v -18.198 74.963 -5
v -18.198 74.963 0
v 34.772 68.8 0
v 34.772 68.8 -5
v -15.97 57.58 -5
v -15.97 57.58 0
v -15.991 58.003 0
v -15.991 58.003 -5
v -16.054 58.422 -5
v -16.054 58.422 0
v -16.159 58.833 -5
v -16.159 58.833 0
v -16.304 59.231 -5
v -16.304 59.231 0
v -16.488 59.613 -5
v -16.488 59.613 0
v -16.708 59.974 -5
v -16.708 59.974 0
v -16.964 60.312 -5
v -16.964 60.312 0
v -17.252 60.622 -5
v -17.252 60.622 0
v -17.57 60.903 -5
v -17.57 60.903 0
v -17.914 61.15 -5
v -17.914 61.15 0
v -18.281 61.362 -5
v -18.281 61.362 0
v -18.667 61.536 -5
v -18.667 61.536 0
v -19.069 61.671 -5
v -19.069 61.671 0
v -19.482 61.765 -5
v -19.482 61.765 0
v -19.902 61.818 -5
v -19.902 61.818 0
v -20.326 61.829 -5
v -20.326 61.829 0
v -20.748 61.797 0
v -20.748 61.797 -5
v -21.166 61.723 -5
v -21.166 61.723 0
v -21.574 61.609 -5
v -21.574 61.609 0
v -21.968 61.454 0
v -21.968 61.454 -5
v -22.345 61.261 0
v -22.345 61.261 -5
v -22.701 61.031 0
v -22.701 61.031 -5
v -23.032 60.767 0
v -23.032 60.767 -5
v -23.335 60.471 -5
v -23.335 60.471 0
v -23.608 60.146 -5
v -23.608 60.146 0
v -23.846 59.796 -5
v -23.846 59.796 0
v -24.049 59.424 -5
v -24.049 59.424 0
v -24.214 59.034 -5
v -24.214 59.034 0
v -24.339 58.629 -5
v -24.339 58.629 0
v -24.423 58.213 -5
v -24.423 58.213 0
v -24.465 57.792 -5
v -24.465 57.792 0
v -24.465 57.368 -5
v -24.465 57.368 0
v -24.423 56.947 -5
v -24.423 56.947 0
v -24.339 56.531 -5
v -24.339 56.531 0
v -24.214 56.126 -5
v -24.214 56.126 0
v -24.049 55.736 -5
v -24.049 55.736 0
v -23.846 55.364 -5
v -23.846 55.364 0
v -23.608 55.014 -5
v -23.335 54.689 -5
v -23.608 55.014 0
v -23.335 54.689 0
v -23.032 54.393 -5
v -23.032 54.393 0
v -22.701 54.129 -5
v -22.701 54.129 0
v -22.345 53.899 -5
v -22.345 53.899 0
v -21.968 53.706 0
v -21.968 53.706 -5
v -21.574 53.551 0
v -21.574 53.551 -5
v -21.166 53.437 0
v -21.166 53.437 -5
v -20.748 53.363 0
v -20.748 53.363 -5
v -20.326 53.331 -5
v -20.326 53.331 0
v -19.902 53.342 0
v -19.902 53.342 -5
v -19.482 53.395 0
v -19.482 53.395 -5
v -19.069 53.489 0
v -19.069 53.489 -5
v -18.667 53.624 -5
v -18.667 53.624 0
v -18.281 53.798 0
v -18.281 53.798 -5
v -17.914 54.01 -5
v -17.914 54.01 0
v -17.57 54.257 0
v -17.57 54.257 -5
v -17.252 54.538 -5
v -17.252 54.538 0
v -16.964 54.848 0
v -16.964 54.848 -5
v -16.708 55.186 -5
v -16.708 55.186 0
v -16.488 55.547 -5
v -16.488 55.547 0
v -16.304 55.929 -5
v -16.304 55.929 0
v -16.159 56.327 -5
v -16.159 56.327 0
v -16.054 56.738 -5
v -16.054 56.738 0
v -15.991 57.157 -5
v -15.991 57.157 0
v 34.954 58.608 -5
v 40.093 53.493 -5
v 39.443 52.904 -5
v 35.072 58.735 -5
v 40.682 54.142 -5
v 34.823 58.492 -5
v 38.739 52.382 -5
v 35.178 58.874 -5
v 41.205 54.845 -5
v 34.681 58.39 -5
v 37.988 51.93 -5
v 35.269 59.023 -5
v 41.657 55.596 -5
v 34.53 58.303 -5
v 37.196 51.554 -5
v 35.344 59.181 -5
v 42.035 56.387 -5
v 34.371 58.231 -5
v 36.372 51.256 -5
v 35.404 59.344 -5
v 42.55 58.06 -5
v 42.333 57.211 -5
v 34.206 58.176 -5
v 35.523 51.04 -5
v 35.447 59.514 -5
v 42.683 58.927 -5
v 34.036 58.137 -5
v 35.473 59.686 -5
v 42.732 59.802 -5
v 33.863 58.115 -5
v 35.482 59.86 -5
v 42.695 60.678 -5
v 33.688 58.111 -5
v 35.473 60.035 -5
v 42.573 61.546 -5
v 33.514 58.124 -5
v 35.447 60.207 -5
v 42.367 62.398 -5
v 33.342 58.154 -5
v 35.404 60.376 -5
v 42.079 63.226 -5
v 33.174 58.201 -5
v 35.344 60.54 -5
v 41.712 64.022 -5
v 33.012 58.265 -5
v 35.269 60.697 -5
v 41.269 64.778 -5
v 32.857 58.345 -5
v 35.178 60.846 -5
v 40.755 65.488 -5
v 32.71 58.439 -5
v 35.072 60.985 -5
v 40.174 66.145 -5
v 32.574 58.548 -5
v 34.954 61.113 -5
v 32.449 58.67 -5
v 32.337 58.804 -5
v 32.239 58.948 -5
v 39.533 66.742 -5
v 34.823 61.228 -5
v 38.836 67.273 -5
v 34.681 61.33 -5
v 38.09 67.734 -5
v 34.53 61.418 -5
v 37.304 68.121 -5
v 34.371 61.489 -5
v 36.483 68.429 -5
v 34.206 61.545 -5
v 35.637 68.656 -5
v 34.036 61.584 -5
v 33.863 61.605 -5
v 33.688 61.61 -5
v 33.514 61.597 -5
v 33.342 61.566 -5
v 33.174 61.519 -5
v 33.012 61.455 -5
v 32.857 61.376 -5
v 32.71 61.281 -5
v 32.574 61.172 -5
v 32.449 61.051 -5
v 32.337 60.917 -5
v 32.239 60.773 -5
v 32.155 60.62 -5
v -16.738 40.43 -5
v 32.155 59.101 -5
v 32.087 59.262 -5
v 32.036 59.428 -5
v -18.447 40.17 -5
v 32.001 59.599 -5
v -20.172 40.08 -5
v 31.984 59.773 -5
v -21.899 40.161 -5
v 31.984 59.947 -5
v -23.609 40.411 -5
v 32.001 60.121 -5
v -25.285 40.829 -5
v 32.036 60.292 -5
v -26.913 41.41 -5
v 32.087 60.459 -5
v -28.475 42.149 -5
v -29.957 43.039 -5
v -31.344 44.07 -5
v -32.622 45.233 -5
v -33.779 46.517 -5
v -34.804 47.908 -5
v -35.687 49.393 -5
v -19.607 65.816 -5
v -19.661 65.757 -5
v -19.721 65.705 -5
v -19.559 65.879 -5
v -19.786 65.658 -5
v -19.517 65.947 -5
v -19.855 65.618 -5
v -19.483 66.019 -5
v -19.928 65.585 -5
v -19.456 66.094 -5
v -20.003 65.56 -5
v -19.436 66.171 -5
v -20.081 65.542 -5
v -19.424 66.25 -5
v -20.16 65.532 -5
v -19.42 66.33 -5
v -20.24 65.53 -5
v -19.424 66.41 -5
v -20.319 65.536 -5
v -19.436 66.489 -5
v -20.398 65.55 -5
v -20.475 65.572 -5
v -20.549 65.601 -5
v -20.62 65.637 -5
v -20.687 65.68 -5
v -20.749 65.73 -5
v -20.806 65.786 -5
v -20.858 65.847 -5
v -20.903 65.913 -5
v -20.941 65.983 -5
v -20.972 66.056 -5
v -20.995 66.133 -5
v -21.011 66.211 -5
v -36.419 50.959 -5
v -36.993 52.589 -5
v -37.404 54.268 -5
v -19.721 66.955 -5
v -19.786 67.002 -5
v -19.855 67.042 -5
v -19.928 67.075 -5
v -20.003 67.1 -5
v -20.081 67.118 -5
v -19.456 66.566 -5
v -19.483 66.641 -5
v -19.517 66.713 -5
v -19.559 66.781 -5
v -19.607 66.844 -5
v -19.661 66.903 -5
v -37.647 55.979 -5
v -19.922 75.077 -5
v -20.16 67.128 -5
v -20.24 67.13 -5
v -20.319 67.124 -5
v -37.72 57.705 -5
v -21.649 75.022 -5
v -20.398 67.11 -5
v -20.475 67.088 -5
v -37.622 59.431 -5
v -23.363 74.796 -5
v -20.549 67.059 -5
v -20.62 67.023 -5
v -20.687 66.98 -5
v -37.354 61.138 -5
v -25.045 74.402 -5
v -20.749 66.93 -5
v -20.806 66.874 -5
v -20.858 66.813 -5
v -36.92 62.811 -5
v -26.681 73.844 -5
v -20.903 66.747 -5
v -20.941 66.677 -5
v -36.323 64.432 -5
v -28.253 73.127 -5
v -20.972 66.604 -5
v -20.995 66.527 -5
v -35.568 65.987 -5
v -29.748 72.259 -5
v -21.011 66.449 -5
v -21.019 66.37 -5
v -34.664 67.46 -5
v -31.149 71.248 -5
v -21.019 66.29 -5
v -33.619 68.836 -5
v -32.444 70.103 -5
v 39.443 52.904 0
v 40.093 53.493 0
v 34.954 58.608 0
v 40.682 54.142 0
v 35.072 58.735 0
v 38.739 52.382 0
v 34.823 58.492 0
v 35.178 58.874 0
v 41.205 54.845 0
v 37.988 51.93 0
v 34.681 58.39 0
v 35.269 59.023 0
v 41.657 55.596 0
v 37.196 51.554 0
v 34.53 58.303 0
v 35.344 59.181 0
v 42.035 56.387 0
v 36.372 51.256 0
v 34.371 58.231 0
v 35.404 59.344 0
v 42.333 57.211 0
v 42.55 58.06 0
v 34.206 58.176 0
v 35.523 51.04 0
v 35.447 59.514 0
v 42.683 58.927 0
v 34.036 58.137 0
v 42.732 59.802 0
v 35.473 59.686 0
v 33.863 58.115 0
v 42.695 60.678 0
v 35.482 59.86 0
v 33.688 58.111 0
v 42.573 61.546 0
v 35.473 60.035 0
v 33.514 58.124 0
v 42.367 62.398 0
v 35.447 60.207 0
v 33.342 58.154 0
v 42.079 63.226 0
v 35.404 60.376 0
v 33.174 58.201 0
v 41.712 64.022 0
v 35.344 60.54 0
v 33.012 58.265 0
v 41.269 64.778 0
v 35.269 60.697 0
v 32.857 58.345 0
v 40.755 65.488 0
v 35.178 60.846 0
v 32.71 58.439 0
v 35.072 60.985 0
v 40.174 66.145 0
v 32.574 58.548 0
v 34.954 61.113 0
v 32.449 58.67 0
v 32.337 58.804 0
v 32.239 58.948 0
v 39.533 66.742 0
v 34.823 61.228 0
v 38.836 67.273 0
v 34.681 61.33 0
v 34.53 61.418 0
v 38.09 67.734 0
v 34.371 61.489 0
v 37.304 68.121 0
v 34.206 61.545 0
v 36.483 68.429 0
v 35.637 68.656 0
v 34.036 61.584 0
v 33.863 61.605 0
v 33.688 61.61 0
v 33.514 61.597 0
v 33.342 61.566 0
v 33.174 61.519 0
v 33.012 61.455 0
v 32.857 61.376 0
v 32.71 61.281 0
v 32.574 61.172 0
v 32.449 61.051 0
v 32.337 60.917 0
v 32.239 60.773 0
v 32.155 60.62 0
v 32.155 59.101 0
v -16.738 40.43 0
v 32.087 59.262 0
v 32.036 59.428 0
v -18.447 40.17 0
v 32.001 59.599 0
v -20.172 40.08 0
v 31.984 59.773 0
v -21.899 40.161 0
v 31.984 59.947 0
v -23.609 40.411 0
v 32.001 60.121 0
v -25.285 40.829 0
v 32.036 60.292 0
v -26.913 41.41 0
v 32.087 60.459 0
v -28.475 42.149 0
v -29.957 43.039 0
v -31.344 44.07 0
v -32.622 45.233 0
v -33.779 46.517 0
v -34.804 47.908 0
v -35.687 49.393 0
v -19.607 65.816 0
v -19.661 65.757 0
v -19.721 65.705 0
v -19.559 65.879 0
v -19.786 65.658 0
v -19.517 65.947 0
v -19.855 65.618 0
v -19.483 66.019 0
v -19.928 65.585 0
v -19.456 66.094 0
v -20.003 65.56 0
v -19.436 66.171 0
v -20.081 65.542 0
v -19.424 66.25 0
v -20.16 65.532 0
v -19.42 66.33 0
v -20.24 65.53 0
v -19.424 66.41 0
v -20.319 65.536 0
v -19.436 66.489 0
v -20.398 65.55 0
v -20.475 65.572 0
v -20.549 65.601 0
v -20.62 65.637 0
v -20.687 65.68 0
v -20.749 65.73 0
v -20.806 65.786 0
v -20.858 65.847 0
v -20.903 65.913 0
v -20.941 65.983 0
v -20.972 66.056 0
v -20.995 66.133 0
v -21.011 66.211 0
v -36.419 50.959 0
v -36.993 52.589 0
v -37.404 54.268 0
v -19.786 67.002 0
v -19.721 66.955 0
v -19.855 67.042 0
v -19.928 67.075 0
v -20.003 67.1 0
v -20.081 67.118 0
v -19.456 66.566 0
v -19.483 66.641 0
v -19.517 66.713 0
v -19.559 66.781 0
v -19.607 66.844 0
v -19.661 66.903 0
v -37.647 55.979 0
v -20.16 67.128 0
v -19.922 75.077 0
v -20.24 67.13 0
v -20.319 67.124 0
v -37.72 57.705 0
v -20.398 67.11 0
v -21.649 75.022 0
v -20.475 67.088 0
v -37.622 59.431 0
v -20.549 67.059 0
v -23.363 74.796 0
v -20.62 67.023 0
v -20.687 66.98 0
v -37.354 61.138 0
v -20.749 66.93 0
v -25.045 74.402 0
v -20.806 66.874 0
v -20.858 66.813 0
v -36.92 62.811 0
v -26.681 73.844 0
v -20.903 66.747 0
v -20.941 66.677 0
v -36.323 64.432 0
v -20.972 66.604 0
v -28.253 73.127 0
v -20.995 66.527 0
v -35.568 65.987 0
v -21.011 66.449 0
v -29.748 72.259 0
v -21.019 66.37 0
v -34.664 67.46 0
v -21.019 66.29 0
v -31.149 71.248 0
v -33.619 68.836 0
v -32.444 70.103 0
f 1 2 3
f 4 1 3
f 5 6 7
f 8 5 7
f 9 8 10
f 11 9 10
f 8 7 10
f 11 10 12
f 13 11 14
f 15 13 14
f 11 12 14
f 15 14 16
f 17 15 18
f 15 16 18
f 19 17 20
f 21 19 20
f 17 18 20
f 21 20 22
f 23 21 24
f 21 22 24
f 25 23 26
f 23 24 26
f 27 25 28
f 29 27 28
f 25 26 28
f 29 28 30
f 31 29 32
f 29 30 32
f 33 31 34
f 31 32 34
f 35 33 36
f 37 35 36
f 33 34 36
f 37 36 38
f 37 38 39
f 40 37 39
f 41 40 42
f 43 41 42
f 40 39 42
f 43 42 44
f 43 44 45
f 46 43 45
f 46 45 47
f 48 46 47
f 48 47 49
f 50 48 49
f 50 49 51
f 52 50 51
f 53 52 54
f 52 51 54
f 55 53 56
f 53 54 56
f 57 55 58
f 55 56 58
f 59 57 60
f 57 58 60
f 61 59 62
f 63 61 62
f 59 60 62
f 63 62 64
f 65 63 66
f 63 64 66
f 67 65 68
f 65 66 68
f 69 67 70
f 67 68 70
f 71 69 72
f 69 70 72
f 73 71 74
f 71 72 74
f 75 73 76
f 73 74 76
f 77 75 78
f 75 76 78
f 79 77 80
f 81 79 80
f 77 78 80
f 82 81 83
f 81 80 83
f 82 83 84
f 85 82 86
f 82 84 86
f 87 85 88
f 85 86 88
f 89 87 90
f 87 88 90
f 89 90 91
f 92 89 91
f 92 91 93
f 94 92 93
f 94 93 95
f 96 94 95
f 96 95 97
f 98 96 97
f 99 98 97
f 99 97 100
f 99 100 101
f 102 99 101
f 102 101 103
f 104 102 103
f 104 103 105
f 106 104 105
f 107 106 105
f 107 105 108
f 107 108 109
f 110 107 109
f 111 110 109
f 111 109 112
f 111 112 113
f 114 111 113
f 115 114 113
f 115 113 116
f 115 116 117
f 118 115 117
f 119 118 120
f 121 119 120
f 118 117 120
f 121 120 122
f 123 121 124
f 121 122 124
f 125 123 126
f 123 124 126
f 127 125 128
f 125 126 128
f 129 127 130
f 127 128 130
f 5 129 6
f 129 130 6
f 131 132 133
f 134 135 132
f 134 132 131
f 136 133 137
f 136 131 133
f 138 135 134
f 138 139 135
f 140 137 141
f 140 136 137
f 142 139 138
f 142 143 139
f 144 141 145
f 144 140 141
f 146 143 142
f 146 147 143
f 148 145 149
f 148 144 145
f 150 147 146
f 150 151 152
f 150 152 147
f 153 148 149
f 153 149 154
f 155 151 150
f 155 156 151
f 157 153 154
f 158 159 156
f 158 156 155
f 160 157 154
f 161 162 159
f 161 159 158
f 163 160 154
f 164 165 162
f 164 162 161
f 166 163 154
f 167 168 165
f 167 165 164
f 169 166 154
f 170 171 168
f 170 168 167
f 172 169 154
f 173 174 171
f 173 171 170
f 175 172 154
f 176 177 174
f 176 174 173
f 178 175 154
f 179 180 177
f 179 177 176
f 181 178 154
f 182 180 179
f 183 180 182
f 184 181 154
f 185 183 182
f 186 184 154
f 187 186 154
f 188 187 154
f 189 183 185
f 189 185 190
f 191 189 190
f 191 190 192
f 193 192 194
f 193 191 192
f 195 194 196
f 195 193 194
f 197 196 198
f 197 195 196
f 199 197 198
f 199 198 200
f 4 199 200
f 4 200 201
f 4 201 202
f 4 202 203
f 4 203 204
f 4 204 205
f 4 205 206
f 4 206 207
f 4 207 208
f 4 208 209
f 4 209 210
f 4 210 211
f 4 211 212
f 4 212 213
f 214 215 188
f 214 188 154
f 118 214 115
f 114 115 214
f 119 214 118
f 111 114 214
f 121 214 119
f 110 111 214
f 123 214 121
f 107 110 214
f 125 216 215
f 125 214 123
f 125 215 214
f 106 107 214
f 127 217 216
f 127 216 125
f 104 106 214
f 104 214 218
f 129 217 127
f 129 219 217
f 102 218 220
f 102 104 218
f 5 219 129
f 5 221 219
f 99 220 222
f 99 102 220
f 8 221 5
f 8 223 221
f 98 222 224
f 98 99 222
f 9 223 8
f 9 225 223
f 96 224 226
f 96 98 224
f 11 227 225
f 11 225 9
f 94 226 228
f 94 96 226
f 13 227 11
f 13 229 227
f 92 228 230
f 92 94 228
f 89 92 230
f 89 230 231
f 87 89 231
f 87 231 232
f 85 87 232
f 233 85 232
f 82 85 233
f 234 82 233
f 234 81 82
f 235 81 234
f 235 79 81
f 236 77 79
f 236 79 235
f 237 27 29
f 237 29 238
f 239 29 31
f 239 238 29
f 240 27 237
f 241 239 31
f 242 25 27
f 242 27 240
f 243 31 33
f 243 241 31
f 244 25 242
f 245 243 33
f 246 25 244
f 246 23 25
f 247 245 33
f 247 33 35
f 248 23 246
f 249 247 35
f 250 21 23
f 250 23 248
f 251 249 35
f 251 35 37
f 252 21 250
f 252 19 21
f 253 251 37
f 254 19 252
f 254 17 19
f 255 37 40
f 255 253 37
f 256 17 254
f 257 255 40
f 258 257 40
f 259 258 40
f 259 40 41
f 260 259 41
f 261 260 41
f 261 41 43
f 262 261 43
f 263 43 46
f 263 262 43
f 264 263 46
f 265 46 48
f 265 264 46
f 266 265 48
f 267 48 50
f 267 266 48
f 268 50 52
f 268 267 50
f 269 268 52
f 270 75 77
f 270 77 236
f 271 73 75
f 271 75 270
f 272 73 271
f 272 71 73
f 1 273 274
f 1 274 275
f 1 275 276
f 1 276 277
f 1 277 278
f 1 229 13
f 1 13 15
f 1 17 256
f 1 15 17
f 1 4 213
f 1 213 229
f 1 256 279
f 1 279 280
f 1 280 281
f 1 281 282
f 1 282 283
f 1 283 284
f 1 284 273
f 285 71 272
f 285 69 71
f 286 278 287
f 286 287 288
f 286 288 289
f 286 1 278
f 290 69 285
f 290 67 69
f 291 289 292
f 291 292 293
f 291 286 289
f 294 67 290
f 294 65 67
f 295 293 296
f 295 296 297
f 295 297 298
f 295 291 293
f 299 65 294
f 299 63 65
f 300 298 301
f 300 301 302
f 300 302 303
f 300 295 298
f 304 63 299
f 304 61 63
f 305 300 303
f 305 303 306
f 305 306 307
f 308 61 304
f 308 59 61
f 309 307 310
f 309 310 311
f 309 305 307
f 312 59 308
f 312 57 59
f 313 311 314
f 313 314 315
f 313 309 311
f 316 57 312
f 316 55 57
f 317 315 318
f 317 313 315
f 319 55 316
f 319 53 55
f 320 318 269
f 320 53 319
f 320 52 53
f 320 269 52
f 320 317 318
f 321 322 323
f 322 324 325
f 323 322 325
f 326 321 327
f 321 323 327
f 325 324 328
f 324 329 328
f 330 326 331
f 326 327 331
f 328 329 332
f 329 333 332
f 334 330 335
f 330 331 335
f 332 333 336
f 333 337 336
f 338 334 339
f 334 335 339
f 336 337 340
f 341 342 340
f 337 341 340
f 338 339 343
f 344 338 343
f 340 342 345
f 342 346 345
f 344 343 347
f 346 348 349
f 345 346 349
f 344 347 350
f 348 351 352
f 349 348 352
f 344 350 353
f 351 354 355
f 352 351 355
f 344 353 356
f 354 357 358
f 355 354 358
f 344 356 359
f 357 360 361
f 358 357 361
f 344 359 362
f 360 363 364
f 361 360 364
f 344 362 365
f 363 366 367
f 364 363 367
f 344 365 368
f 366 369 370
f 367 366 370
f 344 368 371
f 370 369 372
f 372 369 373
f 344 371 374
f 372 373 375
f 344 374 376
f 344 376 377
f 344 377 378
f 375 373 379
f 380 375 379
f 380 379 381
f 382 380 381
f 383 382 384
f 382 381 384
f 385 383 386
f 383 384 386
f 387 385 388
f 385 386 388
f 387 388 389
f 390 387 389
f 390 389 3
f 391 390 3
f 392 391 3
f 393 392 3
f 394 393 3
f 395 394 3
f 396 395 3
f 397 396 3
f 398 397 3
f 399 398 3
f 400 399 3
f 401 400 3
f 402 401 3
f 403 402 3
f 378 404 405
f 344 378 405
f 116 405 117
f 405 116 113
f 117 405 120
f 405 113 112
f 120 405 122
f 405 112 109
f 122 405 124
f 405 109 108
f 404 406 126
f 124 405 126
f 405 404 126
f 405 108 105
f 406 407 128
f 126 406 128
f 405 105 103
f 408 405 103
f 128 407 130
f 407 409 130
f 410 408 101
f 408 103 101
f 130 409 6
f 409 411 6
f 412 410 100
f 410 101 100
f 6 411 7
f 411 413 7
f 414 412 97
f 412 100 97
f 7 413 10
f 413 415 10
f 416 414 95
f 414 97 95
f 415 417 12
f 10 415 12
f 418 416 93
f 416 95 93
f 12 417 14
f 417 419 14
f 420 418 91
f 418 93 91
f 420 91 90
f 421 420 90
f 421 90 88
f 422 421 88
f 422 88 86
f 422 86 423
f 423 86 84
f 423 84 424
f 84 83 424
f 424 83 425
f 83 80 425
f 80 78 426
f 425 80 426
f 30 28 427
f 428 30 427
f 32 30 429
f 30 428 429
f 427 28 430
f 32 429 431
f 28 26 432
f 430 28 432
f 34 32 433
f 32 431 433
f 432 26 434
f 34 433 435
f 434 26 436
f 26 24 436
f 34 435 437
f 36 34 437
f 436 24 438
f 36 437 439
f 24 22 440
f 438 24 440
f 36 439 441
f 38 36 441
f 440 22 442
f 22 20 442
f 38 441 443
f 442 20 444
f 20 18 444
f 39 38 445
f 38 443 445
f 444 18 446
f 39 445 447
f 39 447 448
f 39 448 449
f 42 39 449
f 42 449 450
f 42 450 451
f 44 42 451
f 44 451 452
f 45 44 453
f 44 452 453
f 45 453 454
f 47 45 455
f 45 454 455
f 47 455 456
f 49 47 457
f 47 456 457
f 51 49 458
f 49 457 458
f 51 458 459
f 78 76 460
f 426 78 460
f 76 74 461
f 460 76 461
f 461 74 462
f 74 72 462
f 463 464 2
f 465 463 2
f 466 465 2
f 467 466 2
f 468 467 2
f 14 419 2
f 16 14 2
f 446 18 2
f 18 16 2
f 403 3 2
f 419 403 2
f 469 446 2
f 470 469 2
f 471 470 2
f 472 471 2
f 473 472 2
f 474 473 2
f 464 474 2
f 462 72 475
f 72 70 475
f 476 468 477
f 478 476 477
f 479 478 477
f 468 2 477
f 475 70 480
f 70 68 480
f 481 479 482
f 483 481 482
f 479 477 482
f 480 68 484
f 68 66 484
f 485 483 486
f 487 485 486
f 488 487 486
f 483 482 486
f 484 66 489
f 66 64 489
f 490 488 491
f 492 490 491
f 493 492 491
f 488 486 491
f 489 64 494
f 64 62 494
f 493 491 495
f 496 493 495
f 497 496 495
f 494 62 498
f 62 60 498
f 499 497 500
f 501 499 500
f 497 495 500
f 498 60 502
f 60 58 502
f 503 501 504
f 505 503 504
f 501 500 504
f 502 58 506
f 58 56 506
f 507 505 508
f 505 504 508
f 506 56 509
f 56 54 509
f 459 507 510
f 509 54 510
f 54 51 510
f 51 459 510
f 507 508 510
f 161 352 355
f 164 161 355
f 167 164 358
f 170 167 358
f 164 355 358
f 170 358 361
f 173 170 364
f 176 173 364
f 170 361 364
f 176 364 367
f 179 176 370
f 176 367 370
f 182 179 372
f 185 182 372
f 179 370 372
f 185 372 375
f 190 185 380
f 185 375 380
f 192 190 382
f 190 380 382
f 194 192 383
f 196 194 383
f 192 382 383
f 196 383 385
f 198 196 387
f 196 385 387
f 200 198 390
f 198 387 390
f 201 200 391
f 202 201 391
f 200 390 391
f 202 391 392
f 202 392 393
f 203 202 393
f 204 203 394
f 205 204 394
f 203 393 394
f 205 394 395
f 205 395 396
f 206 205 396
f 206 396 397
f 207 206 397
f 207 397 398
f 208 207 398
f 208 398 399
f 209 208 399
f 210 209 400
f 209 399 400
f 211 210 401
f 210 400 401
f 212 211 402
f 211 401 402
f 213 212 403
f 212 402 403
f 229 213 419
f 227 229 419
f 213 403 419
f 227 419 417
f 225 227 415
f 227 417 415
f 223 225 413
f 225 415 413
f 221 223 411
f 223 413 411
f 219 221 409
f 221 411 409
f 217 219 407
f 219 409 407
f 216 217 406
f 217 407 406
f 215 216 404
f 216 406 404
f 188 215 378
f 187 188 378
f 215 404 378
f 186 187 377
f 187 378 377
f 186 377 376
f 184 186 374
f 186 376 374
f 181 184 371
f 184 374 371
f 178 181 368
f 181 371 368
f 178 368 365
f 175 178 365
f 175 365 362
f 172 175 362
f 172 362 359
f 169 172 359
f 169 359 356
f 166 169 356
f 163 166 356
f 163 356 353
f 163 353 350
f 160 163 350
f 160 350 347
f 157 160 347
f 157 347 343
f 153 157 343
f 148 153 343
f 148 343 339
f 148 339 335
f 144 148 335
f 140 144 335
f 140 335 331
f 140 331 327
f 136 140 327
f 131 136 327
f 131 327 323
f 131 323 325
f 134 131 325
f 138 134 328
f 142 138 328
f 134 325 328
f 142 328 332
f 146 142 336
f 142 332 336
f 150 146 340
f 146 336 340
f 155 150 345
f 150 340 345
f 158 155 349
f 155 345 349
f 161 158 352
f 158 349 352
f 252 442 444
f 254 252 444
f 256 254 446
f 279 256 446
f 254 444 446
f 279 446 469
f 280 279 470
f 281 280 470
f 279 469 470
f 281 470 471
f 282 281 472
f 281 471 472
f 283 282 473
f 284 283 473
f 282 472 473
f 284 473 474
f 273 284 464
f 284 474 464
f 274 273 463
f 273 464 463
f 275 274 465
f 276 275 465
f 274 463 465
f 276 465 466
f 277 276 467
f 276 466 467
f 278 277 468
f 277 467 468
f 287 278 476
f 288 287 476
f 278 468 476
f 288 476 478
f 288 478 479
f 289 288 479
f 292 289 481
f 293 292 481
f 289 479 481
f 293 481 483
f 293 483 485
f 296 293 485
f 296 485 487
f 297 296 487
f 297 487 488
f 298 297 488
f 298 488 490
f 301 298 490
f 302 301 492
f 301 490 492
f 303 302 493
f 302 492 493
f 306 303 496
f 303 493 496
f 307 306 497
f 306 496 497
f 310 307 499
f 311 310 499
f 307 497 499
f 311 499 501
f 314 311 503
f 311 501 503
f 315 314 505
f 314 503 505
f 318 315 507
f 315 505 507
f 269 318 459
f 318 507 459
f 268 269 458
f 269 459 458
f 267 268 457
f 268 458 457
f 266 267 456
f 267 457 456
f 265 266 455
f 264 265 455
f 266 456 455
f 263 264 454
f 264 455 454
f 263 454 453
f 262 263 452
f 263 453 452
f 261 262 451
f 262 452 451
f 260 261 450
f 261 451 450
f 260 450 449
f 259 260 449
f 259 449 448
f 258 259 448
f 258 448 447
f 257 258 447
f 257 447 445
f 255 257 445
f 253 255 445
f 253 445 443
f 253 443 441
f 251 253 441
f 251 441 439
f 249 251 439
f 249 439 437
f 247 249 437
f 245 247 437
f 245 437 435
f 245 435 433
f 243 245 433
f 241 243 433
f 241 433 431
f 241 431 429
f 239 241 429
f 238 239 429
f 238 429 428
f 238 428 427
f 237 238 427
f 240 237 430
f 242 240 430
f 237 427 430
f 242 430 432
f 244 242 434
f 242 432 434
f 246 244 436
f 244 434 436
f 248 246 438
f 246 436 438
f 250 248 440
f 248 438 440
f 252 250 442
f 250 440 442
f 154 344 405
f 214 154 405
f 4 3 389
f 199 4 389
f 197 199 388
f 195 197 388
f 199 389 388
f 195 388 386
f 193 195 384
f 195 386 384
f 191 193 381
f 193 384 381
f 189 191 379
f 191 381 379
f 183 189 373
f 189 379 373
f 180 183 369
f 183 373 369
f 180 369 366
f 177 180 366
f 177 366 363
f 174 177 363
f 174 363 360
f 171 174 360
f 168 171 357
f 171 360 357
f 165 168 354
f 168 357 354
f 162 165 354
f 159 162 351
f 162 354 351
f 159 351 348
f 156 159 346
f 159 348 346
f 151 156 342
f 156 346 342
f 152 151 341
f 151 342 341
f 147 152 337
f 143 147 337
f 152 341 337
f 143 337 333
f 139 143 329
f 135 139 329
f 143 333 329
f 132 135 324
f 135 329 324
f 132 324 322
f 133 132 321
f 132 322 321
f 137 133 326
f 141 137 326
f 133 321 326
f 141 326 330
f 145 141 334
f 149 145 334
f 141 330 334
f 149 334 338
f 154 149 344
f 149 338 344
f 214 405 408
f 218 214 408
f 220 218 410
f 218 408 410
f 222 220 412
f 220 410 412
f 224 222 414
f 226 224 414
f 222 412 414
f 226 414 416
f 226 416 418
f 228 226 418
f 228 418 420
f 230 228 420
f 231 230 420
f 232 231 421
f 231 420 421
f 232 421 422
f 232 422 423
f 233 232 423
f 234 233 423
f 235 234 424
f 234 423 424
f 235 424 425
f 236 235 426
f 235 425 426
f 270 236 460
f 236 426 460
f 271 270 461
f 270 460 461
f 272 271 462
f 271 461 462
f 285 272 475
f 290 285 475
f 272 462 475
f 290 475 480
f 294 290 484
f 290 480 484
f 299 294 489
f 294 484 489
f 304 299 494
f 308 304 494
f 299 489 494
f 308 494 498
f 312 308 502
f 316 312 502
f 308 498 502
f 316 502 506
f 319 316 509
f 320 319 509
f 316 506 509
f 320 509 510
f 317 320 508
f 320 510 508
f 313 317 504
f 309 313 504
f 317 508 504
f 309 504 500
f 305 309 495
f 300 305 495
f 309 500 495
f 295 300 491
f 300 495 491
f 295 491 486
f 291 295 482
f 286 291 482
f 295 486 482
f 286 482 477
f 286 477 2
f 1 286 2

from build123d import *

# Parameters (mm, degrees)
SKETCH1_R           = 4.25
SKETCH1_R_2         = 1.75
SKETCH1_R_3         = 0.8
BOSS_EXTRUDE1_DEPTH = 5


with BuildPart() as part:
    # Sketch1 → Boss-Extrude1 (new body)
    with BuildSketch(Plane.XY):
        with BuildLine():
            Line((-18.197591032, 74.9627461), (34.771929891, 68.799966437))
            ThreePointArc((34.771929891, 68.799966437), (42.723806159, 60.240313183), (35.522543907, 51.040214163))
            Line((35.522543907, 51.040214163), (-16.738063779, 40.429894456))
            ThreePointArc((-16.738063779, 40.429894456), (-37.7043906, 56.841024116), (-18.197591032, 74.9627461))
        make_face()
        with Locations((-20.22, 57.58)):
            Circle(SKETCH1_R, mode=Mode.SUBTRACT)
        with Locations((33.73183385, 59.860268443)):
            Circle(SKETCH1_R_2, mode=Mode.SUBTRACT)
        with Locations((-20.22, 66.33)):
            Circle(SKETCH1_R_3, mode=Mode.SUBTRACT)
    extrude(amount=-BOSS_EXTRUDE1_DEPTH)


solid = part.part
